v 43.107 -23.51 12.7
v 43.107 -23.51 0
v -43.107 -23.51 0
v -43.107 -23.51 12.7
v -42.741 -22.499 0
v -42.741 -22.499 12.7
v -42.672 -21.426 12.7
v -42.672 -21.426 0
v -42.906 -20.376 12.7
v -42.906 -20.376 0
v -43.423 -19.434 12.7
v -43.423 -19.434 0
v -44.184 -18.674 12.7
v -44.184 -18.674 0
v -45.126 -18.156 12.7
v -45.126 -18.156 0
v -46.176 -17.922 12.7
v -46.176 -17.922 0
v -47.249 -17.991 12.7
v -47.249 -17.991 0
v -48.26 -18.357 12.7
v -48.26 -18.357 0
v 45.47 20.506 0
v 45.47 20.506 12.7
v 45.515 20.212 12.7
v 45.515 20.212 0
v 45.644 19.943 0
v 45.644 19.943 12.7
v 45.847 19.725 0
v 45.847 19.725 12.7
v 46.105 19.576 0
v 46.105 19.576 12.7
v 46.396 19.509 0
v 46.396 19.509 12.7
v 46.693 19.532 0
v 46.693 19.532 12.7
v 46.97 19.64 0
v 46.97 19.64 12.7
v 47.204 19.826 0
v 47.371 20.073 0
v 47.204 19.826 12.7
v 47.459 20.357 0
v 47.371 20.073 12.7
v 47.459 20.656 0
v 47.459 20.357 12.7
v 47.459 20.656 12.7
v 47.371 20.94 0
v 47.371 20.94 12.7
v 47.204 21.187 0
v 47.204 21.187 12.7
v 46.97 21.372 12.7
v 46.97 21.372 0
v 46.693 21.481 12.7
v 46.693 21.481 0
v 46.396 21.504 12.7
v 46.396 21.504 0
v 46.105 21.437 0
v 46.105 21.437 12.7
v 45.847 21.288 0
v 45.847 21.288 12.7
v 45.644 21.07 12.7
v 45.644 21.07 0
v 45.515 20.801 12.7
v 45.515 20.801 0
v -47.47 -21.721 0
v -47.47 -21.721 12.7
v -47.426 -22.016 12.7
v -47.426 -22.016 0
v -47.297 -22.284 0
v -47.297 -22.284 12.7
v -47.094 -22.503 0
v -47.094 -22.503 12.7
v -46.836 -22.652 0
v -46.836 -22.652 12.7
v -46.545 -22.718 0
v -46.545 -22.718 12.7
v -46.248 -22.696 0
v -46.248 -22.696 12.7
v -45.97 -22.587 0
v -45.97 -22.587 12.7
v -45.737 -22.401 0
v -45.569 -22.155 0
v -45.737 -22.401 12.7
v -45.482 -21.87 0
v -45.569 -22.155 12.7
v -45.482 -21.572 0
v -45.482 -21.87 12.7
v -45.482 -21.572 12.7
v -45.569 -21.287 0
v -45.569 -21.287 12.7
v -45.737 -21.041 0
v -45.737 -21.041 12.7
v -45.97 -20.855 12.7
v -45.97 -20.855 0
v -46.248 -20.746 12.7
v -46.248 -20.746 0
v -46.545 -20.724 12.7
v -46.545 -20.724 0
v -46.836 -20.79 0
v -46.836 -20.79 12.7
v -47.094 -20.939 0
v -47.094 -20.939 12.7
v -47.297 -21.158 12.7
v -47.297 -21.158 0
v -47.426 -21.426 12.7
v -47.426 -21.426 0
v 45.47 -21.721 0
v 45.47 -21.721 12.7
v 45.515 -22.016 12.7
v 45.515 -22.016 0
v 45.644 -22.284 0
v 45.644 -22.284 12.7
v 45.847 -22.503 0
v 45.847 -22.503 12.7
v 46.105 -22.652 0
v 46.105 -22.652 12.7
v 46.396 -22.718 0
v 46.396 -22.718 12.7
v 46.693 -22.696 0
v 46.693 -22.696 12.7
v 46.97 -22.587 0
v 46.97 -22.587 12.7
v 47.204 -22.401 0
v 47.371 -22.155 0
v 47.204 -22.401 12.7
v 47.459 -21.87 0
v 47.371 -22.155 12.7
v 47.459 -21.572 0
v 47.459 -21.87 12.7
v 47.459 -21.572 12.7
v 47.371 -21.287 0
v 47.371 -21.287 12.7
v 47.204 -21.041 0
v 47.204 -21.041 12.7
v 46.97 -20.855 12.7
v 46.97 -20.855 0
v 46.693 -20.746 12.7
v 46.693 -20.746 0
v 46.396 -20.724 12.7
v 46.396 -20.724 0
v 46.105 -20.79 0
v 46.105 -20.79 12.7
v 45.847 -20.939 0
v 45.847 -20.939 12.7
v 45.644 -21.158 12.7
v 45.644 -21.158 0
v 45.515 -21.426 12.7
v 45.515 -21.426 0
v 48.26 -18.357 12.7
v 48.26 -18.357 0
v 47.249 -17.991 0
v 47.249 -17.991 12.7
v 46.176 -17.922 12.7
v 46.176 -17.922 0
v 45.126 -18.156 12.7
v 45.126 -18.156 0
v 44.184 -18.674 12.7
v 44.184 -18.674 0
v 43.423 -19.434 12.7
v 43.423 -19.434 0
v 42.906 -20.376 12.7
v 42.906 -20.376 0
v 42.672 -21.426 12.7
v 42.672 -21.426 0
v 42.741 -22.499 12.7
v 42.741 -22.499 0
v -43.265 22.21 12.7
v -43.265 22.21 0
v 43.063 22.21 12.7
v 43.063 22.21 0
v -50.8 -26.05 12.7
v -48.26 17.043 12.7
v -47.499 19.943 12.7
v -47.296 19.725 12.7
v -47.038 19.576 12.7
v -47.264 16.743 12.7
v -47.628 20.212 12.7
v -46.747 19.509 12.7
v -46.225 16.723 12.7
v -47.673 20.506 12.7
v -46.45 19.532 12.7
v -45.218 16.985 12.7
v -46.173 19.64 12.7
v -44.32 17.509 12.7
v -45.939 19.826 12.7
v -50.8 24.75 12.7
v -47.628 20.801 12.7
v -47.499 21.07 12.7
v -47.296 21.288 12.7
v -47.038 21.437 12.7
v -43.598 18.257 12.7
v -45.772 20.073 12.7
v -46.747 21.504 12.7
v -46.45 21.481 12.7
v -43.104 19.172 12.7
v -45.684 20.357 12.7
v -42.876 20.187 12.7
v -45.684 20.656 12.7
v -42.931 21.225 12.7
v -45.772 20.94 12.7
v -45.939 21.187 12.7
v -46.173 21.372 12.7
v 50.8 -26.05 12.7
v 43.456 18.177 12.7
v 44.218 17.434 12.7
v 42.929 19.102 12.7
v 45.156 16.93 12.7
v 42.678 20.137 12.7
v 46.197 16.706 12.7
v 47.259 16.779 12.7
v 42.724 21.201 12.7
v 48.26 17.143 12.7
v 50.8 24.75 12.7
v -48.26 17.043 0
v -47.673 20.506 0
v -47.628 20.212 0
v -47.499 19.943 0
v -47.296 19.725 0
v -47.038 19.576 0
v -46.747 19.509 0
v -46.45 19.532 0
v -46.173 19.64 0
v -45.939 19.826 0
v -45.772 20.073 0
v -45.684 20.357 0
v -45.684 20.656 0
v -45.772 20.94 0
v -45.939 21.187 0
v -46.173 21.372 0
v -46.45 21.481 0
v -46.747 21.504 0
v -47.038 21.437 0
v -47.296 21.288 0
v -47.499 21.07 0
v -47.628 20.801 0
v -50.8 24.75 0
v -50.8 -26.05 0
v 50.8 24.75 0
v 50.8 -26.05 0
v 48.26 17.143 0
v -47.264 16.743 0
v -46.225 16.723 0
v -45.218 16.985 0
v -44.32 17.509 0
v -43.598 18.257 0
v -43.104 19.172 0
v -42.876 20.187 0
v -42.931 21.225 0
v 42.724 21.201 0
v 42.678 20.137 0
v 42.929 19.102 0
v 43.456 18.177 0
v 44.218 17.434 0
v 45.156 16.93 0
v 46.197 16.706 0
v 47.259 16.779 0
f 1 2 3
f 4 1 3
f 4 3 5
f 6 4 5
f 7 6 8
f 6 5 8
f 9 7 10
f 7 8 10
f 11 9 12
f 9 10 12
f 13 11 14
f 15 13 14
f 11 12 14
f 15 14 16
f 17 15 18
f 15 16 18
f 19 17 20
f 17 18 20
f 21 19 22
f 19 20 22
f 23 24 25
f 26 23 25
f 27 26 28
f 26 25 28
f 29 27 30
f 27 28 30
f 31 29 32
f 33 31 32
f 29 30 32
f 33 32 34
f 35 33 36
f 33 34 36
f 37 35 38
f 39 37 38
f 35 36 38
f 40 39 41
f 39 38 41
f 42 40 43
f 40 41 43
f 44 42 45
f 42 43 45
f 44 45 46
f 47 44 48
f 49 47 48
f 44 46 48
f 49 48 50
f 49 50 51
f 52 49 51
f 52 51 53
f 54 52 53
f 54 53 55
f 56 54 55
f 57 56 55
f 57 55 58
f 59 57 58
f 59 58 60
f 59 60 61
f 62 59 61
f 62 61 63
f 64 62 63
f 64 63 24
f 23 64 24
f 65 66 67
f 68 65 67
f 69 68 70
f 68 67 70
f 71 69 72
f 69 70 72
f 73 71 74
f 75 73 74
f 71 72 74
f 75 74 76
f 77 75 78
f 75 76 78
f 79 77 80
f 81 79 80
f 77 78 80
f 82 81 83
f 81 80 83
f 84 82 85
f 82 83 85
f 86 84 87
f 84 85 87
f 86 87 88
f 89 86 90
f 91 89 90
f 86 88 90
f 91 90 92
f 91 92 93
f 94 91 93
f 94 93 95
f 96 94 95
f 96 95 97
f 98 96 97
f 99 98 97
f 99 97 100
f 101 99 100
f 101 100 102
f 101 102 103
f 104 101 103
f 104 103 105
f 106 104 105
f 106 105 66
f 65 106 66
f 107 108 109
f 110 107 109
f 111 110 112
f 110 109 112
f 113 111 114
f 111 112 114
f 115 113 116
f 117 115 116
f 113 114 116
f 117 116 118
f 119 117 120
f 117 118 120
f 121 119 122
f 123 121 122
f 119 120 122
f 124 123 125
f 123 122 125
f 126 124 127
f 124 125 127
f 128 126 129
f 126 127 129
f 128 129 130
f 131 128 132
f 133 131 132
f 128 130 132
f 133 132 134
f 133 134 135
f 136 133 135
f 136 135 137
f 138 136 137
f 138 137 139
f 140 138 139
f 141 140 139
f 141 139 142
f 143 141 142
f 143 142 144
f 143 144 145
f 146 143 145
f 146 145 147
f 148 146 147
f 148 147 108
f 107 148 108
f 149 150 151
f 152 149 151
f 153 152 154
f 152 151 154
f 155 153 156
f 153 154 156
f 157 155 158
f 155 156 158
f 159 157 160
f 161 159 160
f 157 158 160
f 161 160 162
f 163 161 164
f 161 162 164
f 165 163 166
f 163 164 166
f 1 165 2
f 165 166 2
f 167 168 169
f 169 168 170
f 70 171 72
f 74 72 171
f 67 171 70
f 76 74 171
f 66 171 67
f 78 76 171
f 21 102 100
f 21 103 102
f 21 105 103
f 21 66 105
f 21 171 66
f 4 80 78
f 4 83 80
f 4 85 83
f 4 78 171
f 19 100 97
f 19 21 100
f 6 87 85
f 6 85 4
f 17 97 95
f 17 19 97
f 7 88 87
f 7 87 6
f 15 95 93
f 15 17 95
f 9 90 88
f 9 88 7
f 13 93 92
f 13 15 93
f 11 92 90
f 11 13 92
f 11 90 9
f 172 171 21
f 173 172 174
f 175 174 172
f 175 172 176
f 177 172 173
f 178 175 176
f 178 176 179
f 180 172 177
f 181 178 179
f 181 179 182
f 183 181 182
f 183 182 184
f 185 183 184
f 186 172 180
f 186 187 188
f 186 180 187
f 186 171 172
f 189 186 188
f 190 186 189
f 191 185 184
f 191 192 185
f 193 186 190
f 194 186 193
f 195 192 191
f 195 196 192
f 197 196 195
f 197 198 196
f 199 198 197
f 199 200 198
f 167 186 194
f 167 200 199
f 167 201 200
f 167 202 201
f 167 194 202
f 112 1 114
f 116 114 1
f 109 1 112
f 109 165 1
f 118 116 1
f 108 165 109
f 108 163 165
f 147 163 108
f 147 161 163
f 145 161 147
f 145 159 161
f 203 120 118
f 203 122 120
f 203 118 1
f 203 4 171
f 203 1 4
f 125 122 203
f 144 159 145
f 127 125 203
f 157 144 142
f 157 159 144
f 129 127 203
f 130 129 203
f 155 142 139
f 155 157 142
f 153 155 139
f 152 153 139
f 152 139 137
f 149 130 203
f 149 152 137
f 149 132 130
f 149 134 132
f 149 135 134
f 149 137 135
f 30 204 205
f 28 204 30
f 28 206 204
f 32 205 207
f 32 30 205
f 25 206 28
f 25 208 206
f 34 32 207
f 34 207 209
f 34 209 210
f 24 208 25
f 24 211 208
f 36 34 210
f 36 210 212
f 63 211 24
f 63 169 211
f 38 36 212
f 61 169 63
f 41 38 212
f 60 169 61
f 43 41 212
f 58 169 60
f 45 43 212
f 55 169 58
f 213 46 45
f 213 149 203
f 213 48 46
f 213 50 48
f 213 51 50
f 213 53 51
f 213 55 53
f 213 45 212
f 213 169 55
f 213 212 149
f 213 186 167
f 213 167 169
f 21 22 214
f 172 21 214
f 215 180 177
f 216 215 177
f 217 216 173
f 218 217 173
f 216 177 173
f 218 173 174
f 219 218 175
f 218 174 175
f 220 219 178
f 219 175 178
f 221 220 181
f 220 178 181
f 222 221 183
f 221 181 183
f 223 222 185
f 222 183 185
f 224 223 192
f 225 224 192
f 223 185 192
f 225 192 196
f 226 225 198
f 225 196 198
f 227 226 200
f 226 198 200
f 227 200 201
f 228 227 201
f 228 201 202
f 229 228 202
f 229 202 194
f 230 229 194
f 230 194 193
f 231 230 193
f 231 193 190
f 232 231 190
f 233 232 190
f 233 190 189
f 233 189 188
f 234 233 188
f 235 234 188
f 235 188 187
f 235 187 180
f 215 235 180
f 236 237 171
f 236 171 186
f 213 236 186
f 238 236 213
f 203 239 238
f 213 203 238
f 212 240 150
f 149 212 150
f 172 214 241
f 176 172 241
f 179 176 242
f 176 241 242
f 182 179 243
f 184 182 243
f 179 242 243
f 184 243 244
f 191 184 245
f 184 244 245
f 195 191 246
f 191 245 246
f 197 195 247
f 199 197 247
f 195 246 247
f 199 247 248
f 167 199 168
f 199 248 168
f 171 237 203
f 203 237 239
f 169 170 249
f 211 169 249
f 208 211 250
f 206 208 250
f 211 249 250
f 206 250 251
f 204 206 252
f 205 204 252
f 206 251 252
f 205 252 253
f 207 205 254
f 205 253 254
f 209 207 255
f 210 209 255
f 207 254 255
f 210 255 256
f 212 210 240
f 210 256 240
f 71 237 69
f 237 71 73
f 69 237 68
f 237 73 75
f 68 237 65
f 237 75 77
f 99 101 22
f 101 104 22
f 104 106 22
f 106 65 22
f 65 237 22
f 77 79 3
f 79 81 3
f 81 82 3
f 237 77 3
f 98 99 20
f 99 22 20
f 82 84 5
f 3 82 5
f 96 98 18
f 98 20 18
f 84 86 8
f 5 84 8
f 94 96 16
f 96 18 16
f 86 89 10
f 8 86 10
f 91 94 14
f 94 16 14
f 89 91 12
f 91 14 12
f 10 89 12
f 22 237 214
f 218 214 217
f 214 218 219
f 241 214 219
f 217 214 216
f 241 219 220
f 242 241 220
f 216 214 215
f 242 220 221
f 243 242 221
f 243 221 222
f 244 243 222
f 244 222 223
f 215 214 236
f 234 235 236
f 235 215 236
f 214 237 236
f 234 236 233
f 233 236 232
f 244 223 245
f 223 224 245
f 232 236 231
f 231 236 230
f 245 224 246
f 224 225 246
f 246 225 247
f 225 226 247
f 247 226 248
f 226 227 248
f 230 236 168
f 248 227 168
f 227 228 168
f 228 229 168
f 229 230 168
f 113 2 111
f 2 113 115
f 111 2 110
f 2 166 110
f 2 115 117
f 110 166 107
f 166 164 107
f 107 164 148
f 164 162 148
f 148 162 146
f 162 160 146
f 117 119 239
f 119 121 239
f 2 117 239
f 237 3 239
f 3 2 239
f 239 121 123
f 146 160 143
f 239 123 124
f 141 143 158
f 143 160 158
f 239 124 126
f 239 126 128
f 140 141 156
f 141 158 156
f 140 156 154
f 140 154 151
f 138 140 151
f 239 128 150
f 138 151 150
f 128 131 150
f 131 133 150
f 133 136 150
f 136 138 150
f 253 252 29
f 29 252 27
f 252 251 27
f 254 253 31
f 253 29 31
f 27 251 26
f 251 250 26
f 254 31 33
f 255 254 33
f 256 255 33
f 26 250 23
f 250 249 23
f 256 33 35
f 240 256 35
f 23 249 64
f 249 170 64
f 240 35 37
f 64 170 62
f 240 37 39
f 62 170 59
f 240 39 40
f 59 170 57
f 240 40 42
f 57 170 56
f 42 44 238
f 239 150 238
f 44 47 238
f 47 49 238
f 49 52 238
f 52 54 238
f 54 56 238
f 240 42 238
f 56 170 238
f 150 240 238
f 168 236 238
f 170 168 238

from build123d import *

# Parameters (mm, degrees)
F0_W     = 101.6
F0_H     = 50.8
F1_DEPTH = 12.7
F2_D     = 2
F2_DEPTH = 14.1986
F2_TIP   = 0.600860619
F3_D     = 2
F3_DEPTH = 14.1986
F3_TIP   = 0.600860619
F4_D     = 2
F4_DEPTH = 14.1986
F4_TIP   = 0.600860619
F5_D     = 2
F5_DEPTH = 14.2
F5_TIP   = 0.600860619


with BuildPart() as f1:
    # F0 (on Top) → F1 (new body)
    with BuildSketch(Plane.XY):
        with Locations((0, -0.6499526367)):
            Rectangle(F0_W, F0_H)
        with BuildLine():
            ThreePointArc((-48.26, 17.0429494041), (-43.933302429, 17.85827907), (-43.2645819675, 22.2100473633))
            Line((-43.2645819675, 22.2100473633), (43.0625333975, 22.2100473633))
            ThreePointArc((43.0625333975, 22.2100473633), (43.810791793, 17.7784065979), (48.26, 17.1428935527))
            Line((48.26, 17.1428935527), (48.26, -18.3574629872))
            ThreePointArc((48.26, -18.3574629872), (43.7766277668, -19.0267059263), (43.1065444682, -23.5099526367))
            Line((43.1065444682, -23.5099526367), (-43.1065444682, -23.5099526367))
            ThreePointArc((-43.1065444682, -23.5099526367), (-43.7766277668, -19.0267059263), (-48.26, -18.3574629872))
            Line((-48.26, -18.3574629872), (-48.26, 17.0429494041))
        make_face(mode=Mode.SUBTRACT)
    extrude(amount=F1_DEPTH)

    # F2
    with Locations(Plane(origin=(0, 0, 0), x_dir=(1, 0, 0), z_dir=(0, 0, -1))):
        with Locations((46.4704521, -20.5064658076)):
            Hole(F2_D / 2, depth=F2_DEPTH)
            with Locations((0, 0, -(F2_DEPTH + F2_TIP / 2))):  # 118° drill point
                Cone(0, F2_D / 2, F2_TIP, mode=Mode.SUBTRACT)

    # F3
    with Locations(Plane(origin=(0, 0, 0), x_dir=(1, 0, 0), z_dir=(0, 0, -1))):
        with Locations((-46.4704521, 21.7210352421)):
            Hole(F3_D / 2, depth=F3_DEPTH)
            with Locations((0, 0, -(F3_DEPTH + F3_TIP / 2))):  # 118° drill point
                Cone(0, F3_D / 2, F3_TIP, mode=Mode.SUBTRACT)

    # F4
    with Locations(Plane(origin=(0, 0, 0), x_dir=(1, 0, 0), z_dir=(0, 0, -1))):
        with Locations((46.4704521, 21.7210352421)):
            Hole(F4_D / 2, depth=F4_DEPTH)
            with Locations((0, 0, -(F4_DEPTH + F4_TIP / 2))):  # 118° drill point
                Cone(0, F4_D / 2, F4_TIP, mode=Mode.SUBTRACT)

    # F5
    with Locations(Plane(origin=(0, 0, 0), x_dir=(1, 0, 0), z_dir=(0, 0, -1))):
        with Locations((-46.67250067, -20.5064658076)):
            Hole(F5_D / 2, depth=F5_DEPTH)
            with Locations((0, 0, -(F5_DEPTH + F5_TIP / 2))):  # 118° drill point
                Cone(0, F5_D / 2, F5_TIP, mode=Mode.SUBTRACT)


solid = f1.part
